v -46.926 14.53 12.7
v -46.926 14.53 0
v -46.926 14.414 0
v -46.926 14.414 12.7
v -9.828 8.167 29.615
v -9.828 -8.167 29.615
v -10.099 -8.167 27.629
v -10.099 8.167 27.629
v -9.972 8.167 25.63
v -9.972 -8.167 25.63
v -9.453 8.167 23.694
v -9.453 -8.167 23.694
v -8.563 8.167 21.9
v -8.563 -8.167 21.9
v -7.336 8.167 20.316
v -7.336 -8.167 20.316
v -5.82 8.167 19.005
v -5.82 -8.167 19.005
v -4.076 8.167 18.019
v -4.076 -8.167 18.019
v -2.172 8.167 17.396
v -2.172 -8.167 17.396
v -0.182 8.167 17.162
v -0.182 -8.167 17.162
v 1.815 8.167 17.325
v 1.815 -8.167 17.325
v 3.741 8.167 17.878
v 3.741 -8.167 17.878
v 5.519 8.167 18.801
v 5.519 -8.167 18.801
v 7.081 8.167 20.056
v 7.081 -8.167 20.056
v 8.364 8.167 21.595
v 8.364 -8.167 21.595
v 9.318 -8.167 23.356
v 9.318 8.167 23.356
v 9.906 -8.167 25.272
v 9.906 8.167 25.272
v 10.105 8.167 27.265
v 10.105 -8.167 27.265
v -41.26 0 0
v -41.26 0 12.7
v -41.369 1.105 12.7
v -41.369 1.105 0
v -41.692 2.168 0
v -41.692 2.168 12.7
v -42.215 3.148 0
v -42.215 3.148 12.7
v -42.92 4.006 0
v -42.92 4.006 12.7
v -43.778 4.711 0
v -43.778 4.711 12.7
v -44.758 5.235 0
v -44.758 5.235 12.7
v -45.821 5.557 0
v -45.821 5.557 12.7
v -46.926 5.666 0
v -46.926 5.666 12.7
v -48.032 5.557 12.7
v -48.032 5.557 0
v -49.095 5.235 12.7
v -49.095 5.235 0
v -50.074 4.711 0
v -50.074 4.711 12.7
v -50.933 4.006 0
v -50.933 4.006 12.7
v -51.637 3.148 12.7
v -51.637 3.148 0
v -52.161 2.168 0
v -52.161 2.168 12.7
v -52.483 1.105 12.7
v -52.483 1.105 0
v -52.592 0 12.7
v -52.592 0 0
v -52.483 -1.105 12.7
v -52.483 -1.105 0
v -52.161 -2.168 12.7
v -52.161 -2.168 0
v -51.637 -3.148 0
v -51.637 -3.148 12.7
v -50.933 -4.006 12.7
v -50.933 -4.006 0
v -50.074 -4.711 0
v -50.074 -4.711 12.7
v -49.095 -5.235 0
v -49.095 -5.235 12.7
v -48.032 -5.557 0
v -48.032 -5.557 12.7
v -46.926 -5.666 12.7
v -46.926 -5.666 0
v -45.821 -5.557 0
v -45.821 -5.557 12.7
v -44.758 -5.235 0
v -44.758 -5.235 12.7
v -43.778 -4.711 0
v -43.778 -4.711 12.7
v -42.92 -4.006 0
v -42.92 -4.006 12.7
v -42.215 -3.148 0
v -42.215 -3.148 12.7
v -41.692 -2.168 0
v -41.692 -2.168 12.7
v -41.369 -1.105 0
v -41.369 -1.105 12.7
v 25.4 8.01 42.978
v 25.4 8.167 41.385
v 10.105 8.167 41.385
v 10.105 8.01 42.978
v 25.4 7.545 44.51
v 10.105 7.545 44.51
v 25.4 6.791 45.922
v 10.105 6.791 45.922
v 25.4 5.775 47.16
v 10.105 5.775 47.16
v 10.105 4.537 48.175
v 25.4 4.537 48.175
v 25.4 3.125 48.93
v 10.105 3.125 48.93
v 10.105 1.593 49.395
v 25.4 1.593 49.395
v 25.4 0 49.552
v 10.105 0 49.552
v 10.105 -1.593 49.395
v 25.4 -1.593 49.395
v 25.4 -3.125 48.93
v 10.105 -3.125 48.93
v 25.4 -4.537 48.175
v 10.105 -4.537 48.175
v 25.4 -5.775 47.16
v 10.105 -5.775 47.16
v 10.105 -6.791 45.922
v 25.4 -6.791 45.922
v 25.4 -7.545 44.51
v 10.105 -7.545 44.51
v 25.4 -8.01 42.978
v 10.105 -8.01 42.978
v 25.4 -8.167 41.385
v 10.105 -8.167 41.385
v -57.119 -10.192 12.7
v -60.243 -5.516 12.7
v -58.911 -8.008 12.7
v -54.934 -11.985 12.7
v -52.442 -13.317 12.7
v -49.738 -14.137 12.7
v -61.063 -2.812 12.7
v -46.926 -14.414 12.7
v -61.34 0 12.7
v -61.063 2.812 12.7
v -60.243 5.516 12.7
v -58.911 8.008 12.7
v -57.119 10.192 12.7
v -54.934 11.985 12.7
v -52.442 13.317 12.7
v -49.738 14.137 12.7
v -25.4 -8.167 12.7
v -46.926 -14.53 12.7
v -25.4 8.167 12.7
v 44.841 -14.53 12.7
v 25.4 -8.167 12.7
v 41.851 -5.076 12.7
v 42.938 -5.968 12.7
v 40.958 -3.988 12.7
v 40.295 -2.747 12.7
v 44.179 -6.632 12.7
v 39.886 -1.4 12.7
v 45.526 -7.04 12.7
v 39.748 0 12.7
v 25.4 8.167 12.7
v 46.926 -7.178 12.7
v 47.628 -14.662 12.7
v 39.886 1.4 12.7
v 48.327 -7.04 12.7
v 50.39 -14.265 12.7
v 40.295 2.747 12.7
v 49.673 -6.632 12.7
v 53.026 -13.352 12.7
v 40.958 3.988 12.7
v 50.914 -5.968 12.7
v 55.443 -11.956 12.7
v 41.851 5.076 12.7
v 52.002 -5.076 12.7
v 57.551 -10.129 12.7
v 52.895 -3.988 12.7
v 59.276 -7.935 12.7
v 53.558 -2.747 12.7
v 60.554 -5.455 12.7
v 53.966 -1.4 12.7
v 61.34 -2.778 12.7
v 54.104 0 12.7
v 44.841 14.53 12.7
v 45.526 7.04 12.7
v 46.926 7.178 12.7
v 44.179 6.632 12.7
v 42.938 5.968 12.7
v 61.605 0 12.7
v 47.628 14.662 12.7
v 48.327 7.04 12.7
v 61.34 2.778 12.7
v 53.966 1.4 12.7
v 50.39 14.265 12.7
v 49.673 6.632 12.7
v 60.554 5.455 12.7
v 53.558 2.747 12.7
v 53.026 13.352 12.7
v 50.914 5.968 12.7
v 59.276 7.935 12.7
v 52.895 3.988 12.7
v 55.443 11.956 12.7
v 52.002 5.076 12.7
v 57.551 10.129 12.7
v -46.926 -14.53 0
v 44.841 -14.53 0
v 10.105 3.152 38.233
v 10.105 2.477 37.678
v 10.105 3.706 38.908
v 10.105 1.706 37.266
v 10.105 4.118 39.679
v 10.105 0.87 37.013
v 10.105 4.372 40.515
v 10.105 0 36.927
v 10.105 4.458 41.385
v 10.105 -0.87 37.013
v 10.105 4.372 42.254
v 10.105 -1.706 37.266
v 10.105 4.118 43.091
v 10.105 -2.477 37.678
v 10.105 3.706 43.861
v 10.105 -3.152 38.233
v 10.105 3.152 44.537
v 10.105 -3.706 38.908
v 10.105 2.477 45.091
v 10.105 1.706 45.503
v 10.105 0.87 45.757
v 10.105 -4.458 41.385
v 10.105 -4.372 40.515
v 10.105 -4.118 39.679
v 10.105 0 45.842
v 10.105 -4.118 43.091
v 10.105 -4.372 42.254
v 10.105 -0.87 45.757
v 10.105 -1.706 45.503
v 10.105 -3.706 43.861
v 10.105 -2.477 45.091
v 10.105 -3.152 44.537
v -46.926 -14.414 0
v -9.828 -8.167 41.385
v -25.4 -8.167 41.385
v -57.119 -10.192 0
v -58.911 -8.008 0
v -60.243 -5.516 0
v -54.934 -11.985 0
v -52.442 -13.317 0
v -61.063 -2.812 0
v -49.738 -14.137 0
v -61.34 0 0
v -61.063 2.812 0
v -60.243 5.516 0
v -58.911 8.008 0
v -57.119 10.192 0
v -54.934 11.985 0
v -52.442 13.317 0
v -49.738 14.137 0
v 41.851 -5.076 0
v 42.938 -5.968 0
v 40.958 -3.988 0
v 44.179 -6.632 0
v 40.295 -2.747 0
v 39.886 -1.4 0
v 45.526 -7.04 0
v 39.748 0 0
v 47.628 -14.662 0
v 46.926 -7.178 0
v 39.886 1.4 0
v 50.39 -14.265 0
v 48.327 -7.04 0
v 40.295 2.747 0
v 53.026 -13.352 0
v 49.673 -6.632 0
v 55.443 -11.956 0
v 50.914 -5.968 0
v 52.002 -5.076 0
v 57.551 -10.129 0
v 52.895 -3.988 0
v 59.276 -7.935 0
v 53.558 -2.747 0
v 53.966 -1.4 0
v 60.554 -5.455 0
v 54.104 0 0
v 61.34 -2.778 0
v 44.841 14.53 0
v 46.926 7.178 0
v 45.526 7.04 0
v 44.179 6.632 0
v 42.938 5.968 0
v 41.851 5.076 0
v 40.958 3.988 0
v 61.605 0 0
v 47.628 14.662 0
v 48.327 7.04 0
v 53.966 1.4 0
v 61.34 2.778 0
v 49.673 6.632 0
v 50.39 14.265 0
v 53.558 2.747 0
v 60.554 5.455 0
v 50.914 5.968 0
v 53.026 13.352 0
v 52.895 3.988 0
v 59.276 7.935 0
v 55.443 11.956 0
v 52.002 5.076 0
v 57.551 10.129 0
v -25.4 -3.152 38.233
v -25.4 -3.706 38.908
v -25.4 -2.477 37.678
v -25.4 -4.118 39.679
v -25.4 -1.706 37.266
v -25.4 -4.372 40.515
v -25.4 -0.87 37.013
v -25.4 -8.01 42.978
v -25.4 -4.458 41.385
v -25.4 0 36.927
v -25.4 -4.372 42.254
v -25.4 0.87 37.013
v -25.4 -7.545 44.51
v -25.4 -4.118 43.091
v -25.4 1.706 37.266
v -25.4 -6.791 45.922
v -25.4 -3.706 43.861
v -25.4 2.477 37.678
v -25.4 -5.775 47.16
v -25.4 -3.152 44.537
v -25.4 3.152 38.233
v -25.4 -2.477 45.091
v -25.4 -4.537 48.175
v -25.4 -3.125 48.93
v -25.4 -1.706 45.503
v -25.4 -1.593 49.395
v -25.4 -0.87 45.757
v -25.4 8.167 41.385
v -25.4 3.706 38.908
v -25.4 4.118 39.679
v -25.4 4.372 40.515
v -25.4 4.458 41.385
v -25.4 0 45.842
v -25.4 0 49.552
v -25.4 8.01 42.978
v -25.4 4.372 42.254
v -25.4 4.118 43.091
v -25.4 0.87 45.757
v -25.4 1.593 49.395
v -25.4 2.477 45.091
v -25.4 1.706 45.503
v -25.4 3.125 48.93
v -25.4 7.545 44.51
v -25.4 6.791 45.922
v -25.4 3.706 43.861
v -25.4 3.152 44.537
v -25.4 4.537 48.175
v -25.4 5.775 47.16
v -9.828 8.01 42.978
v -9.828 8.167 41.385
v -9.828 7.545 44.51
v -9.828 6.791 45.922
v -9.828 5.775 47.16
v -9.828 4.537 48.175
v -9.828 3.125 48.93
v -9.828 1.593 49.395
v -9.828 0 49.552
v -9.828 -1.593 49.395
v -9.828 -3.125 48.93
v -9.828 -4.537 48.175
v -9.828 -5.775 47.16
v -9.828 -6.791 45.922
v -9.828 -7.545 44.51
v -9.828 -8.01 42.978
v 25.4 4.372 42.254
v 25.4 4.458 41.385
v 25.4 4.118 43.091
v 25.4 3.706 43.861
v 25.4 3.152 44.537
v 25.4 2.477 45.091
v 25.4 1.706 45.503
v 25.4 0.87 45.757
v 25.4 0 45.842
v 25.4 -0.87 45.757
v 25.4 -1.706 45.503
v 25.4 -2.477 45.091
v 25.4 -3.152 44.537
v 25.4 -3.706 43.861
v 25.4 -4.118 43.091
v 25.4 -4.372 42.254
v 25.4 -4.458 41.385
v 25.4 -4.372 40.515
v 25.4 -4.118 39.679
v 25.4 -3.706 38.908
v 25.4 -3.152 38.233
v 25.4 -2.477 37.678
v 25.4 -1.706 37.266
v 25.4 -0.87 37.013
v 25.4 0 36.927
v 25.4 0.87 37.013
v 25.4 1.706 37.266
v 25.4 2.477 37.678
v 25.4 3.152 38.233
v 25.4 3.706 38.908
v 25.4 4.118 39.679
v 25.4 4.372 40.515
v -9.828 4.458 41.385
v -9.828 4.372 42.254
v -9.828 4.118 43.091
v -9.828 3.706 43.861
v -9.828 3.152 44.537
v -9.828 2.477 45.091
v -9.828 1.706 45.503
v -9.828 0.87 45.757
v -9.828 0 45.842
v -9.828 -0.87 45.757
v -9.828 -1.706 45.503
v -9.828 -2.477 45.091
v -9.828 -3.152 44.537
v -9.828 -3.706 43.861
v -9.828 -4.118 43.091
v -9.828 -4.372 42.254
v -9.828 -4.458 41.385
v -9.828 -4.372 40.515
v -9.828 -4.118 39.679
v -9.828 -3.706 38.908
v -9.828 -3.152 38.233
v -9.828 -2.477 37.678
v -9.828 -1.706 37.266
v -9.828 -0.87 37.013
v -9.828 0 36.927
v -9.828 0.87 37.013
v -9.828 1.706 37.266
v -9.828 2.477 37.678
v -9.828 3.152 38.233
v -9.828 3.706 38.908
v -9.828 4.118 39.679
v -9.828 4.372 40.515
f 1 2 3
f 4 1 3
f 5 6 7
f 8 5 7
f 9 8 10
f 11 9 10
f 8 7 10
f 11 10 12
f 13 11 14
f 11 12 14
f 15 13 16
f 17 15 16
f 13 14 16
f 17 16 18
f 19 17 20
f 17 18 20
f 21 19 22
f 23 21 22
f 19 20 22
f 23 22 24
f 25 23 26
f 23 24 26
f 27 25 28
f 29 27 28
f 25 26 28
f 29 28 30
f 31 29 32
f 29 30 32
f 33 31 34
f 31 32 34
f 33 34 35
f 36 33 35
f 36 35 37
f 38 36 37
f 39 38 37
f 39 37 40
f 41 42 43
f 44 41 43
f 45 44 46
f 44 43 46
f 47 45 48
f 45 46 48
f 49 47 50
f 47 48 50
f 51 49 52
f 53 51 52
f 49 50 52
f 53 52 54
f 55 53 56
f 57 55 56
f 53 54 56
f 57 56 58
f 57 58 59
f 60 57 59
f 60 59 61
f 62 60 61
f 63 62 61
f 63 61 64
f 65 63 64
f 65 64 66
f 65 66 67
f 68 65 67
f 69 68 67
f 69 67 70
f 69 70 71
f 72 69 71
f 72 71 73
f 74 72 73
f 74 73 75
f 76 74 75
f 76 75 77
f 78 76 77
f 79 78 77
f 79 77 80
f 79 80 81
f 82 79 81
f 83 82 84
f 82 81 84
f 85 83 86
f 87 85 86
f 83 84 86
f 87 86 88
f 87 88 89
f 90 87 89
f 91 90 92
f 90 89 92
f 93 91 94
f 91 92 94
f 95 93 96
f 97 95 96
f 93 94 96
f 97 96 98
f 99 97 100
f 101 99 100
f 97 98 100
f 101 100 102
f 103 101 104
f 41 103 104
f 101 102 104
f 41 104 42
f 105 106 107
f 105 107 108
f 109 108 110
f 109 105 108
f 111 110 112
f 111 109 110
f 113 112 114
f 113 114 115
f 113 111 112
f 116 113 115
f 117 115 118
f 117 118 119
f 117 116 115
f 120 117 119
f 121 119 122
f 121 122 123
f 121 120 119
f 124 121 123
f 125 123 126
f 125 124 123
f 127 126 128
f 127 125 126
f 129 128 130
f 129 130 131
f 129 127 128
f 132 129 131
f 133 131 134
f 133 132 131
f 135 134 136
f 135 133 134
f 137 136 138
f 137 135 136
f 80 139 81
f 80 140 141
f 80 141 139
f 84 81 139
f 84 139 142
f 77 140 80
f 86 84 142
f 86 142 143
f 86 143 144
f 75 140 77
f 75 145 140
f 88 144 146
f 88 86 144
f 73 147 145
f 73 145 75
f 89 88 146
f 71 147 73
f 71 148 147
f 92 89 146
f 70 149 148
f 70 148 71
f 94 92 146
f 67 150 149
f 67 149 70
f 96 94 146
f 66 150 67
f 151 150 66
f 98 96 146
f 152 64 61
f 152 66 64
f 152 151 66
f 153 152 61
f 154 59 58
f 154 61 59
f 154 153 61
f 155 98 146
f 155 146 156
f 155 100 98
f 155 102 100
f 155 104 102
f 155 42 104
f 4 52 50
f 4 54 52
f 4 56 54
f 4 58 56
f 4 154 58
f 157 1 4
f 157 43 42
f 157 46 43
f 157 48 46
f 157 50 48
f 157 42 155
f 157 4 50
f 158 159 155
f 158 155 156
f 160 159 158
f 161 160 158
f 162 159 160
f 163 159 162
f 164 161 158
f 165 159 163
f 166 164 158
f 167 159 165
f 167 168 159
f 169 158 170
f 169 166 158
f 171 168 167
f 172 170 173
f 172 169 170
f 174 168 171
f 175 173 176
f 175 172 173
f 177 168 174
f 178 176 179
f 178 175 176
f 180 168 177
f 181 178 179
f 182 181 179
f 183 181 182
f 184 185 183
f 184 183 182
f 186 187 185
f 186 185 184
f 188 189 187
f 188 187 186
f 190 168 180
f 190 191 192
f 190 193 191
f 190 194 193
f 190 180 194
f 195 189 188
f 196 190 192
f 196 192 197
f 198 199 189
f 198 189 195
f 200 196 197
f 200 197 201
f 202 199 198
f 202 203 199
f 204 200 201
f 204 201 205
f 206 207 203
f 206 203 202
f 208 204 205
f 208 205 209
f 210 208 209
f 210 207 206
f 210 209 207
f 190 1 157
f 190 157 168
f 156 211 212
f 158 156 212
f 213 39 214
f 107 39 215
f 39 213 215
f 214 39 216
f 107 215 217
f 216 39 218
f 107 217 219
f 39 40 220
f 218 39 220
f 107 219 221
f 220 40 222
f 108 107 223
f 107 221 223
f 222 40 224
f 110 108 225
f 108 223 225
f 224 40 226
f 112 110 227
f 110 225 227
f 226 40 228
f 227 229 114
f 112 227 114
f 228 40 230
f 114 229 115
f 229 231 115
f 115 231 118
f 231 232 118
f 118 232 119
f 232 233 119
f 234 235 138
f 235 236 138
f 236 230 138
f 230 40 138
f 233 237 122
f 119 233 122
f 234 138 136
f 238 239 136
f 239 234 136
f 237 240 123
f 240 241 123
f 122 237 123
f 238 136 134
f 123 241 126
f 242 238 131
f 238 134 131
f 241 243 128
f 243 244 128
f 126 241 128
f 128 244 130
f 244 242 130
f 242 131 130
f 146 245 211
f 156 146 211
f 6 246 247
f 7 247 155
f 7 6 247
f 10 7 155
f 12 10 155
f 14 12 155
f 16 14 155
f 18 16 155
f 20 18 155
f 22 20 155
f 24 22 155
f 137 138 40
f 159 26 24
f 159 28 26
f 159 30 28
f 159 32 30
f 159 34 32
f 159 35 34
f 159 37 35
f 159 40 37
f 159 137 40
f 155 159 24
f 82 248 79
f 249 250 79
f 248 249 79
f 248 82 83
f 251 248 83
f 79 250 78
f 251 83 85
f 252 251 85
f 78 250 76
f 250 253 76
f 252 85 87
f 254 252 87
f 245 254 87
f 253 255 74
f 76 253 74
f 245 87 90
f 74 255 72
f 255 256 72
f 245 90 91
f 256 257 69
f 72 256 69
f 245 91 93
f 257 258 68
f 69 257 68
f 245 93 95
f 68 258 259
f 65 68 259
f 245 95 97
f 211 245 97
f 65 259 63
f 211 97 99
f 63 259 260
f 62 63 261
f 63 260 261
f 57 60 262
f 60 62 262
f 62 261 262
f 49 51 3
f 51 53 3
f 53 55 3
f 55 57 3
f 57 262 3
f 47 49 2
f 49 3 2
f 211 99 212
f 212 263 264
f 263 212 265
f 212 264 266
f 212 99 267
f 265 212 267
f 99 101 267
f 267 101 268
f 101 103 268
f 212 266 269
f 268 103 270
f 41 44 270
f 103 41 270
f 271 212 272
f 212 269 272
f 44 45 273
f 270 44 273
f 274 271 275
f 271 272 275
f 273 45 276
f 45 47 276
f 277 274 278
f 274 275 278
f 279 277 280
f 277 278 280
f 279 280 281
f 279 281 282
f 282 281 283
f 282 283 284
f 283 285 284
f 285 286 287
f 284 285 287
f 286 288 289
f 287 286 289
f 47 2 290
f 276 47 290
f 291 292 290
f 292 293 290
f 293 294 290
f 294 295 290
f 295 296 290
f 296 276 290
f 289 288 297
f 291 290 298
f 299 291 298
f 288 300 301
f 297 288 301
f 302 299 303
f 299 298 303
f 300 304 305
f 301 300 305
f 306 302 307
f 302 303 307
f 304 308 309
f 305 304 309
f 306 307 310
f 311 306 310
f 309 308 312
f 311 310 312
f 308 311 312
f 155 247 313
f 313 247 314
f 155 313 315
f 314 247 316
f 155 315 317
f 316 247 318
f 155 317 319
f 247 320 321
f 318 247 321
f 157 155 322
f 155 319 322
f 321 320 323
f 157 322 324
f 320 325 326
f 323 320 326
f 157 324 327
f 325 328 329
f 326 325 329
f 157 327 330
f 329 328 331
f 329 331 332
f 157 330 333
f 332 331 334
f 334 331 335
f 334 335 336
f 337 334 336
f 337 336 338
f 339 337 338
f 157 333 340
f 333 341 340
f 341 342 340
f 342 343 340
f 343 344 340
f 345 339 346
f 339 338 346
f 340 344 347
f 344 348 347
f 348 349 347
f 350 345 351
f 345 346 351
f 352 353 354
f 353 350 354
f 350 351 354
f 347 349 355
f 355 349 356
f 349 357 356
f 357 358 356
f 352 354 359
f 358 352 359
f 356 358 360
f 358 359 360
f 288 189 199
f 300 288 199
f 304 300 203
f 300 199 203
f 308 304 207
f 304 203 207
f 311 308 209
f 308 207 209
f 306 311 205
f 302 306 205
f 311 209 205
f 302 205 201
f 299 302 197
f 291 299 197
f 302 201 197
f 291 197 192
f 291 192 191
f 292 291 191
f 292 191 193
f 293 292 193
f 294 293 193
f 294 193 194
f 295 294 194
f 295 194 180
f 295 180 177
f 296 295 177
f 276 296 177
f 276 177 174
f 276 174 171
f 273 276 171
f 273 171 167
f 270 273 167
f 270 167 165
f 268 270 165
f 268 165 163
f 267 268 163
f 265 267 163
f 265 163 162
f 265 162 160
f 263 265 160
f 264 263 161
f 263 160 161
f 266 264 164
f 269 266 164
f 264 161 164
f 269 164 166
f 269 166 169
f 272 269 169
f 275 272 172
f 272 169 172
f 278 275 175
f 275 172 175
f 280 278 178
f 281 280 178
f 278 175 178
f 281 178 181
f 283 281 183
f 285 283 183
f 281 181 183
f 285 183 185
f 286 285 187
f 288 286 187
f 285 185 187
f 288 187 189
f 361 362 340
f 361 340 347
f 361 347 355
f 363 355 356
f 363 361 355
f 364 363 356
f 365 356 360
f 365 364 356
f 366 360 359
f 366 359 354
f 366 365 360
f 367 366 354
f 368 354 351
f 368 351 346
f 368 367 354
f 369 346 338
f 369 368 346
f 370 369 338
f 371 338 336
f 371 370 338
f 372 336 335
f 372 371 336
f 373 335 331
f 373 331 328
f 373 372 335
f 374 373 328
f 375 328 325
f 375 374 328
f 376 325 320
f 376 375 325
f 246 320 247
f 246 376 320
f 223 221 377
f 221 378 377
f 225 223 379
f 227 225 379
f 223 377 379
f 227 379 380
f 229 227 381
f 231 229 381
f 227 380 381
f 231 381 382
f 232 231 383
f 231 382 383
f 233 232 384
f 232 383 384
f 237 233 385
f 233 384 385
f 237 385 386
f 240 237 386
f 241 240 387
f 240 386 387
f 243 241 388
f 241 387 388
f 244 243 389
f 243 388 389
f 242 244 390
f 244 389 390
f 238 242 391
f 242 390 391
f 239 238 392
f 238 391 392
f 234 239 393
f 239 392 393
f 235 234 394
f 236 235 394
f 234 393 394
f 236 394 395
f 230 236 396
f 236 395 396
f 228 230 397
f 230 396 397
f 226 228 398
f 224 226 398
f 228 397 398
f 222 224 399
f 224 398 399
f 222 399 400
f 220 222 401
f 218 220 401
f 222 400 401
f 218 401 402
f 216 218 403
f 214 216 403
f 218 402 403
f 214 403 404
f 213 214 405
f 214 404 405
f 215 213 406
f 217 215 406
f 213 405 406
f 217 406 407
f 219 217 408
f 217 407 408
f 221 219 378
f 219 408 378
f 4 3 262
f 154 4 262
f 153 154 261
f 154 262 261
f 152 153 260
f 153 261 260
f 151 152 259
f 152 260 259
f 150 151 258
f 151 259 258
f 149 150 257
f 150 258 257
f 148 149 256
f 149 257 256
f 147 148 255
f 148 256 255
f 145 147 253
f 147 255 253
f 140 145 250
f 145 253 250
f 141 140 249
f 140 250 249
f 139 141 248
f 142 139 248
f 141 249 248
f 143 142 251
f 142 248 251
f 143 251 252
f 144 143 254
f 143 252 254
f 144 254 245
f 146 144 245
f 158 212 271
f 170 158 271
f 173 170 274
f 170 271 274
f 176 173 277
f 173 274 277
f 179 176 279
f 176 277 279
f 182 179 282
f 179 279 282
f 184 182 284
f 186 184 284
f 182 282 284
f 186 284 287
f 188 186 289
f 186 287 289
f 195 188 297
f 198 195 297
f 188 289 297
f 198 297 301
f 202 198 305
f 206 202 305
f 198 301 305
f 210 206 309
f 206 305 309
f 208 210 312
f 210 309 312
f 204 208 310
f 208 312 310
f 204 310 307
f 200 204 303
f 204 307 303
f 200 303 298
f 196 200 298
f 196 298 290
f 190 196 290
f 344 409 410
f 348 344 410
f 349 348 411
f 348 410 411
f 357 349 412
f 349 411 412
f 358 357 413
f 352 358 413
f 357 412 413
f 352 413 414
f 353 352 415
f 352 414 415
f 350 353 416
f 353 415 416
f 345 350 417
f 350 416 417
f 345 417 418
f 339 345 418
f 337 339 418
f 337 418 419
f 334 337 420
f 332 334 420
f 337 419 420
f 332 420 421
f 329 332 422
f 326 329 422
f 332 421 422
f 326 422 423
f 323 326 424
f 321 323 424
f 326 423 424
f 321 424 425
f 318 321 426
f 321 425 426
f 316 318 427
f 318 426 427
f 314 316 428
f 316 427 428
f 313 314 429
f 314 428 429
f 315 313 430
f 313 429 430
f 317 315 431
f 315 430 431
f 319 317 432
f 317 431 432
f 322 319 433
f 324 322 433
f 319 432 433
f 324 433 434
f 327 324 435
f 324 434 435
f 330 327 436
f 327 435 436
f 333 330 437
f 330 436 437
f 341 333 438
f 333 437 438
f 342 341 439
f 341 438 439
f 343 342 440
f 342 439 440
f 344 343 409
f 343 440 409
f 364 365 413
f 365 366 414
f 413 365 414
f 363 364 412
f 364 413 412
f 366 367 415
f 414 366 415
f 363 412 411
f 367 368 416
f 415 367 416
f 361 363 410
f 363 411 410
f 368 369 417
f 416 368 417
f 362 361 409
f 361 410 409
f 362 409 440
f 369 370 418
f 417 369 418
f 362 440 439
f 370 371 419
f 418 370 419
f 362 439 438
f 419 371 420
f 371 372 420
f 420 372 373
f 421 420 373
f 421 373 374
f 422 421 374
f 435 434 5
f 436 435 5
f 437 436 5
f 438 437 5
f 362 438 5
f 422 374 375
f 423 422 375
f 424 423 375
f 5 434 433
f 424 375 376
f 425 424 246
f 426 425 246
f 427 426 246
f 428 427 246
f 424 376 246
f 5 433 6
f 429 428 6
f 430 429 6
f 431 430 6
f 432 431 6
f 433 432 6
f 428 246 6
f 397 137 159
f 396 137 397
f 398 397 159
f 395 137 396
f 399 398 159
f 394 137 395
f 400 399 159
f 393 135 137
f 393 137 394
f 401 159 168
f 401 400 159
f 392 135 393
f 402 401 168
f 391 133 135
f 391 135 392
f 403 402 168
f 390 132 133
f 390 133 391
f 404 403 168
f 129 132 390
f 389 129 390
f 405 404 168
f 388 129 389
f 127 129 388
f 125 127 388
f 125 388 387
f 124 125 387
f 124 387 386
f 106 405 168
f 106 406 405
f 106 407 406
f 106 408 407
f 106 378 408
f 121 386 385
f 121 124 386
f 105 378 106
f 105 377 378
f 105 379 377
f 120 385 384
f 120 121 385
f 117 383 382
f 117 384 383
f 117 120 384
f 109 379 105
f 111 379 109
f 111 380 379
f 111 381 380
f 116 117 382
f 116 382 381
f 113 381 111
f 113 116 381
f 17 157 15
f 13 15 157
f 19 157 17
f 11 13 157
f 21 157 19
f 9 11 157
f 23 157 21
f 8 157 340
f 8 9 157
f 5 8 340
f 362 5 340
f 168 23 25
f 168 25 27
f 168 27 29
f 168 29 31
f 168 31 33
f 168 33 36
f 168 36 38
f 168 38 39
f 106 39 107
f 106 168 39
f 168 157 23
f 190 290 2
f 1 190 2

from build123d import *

# Parameters (mm, degrees)
F1_DEPTH = 12.7
F2_R     = 7.177953
F2_R_2   = 5.665959
F3_DEPTH = 25.4
F5_DEPTH = 25.4
F6_R     = 4.457647
F7_DEPTH = 63.5
F9_DEPTH = 38.1


with BuildPart() as f1:
    # F0 (on Top) → F1 (new body)
    with BuildSketch(Plane.XY):
        with BuildLine():
            ThreePointArc((44.840731, -14.530204), (61.605395, 0), (44.840731, 14.530204))
            Line((44.840731, 14.530204), (-46.926282, 14.530204))
            Line((-46.926282, 14.530204), (-46.926282, 14.414141))
            ThreePointArc((-46.926282, 14.414141), (-61.340423, 0), (-46.926282, -14.414141))
            Line((-46.926282, -14.414141), (-46.926282, -14.530204))
            Line((-46.926282, -14.530204), (44.840731, -14.530204))
        make_face()
    extrude(amount=F1_DEPTH)

    # F2 (on face) → F3 (cut)
    with BuildSketch(Plane.XY.offset(12.7)):
        with Locations((46.926282, 0)):
            Circle(F2_R)
        with Locations((-46.926282, 0)):
            Circle(F2_R_2)
    extrude(amount=-F3_DEPTH, mode=Mode.SUBTRACT)

    # F4 (on Right) → F5 (join, symmetric)
    with BuildSketch(Plane.YZ):
        with BuildLine():
            Line((-8.16711, 12.592246), (8.16711, 12.592246))
            Line((8.16711, 12.592246), (8.16711, 41.384771))
            ThreePointArc((8.16711, 41.384771), (0, 49.551881), (-8.16711, 41.384771))
            Line((-8.16711, 41.384771), (-8.16711, 12.592246))
        make_face()
    extrude(amount=F5_DEPTH, both=True)

    # F6 (on face) → F7 (cut, symmetric)
    with BuildSketch(Plane.YZ.offset(25.4)):
        with Locations((0, 41.384771)):
            Circle(F6_R)
    extrude(amount=F7_DEPTH, both=True, mode=Mode.SUBTRACT)

    # F8 (on Front) → F9 (cut, symmetric)
    with BuildSketch(Plane.XZ):
        with BuildLine():
            Line((10.105069, 50.244011), (-9.828218, 50.244011))
            Line((-9.828218, 50.244011), (-9.828218, 29.614518))
            ThreePointArc((-9.828218, 29.614518), (-1.182707, 17.229743), (10.105069, 27.265361))
            Line((10.105069, 27.265361), (10.105069, 50.244011))
        make_face()
    extrude(amount=F9_DEPTH, both=True, mode=Mode.SUBTRACT)


solid = f1.part
